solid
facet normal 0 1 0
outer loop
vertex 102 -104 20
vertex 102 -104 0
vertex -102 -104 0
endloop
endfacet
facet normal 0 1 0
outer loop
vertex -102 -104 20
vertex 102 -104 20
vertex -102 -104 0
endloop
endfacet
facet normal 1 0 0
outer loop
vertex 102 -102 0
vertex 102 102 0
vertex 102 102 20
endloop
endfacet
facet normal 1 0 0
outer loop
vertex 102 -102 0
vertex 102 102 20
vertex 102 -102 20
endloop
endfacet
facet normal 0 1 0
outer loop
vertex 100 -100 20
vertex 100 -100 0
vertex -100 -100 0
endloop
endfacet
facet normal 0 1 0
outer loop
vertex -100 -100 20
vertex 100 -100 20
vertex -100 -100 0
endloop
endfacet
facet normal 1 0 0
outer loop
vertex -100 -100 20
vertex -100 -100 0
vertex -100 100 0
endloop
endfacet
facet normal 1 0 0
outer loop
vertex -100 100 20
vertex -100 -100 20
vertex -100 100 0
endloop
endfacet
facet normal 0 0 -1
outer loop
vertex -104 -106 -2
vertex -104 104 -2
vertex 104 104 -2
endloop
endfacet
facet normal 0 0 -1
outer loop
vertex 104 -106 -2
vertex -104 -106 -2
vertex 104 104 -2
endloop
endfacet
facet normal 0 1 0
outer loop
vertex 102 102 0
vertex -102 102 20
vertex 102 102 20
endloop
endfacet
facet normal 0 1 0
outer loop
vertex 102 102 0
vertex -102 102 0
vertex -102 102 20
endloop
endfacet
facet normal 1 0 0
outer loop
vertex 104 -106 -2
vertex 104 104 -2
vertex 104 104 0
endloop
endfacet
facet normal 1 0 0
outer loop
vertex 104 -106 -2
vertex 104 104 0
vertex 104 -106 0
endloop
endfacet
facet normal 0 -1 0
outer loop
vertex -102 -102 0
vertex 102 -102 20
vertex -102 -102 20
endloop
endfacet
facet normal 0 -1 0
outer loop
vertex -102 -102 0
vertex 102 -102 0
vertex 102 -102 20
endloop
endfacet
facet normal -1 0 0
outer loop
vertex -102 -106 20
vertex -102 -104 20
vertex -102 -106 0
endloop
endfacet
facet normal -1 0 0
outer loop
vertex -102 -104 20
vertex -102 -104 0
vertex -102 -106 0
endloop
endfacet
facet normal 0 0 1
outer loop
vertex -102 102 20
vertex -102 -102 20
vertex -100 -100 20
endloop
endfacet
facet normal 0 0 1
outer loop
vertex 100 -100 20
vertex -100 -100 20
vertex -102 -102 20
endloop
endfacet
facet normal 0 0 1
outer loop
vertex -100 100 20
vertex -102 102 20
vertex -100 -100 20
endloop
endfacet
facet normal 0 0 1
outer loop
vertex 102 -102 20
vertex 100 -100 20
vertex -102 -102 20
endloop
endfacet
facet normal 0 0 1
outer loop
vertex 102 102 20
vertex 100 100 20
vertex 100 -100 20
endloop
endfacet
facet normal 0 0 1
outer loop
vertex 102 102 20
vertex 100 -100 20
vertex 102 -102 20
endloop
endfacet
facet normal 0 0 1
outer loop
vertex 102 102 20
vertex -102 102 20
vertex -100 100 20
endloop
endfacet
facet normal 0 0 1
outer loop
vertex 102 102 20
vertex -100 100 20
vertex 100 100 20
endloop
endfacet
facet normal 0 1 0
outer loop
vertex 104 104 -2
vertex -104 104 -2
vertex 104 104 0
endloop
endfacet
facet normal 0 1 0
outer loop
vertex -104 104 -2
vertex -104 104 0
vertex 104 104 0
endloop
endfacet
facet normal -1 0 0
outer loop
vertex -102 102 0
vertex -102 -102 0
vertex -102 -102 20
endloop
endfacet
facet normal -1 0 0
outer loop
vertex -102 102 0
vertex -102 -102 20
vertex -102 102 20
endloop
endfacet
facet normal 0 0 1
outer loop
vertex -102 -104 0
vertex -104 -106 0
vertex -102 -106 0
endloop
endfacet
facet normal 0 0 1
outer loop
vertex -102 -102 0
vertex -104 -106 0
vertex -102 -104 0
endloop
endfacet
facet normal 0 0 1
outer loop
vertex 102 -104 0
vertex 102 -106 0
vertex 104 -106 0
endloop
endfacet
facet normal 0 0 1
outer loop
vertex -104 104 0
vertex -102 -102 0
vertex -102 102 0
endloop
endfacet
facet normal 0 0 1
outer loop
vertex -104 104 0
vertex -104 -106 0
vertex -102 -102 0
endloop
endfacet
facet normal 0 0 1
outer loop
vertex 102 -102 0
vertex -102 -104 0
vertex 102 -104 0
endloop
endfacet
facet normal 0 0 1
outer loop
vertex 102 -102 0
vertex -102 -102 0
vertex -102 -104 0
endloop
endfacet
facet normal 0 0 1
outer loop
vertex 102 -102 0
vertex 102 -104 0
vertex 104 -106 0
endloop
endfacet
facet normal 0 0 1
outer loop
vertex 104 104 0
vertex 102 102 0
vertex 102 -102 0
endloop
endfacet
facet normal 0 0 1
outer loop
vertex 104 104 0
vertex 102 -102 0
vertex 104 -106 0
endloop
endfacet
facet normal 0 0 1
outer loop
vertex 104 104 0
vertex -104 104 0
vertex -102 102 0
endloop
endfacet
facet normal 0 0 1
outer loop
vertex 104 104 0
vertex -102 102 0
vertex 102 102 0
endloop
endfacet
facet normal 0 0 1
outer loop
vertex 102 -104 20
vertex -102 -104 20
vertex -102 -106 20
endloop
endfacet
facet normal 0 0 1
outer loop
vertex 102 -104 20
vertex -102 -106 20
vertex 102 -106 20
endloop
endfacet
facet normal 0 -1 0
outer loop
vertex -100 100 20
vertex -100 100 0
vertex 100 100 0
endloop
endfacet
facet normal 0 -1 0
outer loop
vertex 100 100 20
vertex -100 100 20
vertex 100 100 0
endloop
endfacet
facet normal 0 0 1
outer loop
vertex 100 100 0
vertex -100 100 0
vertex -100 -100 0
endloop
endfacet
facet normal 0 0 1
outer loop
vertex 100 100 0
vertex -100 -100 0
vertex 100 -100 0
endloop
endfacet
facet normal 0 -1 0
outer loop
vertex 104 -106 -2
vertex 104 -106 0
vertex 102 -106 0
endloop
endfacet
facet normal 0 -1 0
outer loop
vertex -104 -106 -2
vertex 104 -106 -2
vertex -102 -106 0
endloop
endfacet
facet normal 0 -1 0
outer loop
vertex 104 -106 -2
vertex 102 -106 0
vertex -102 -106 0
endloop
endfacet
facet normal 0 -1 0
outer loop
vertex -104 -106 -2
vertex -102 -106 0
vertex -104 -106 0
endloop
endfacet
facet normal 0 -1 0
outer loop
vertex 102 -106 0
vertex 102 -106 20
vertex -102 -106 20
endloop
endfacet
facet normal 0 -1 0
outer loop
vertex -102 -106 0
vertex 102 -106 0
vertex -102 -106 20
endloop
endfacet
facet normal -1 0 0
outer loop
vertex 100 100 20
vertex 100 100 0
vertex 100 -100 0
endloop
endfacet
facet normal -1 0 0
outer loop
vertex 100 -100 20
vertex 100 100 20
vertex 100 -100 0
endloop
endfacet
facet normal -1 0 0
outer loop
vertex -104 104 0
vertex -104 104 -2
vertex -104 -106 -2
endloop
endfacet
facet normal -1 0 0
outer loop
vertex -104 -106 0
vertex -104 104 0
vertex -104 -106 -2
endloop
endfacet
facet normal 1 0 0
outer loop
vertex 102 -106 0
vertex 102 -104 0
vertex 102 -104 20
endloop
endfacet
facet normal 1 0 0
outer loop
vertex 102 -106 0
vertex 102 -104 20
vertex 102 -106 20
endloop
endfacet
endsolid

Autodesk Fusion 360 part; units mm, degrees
sketch "Szkic5" plane through (0, 0, 0) normal (0, 0, 1) x (1, 0, 0)
  line L0 (-100, 100) -> (100, 100)
  line L1 (100, 100) -> (100, -100)
  line L2 (100, -100) -> (-100, -100)
  line L3 (-100, -100) -> (-100, 100)
  line L4 (-102, 102) -> (102, 102)
  line L5 (102, 102) -> (102, -102)
  line L6 (102, -102) -> (-102, -102)
  line L7 (-102, -102) -> (-102, 102)
  line L8 (-104, 104) -> (104, 104)
  line L9 (104, 104) -> (104, -104)
  line L10 (104, -104) -> (-104, -104)
  line L11 (-104, -104) -> (-104, 104)
  line L12 (-106, 106) -> (106, 106)
  line L13 (106, 106) -> (106, -106)
  line L14 (106, -106) -> (-106, -106)
  line L15 (-106, -106) -> (-106, 106)
  line L16 (-104, -104) -> (-104, -106)
  line L17 (104, -104) -> (104, -106)
  line L18 (102, -102) -> (102, -104)
  line L19 (-102, -102) -> (-102, -104)
  line L20 (-102, -104) -> (-102, -106)
  line L21 (104, -104) -> (104, -106)
  line L22 (102, -104) -> (102, -106)
  dimension "d31" = 2
  dimension "d32" = 2
  dimension "d33" = 2
  dimension "d34" = 2
  dimension "d35" = 2
  dimension "d36" = 2
  dimension "d37" = 2
  dimension "d38" = 2
  dimension "d39" = 2
  dimension "d40" = 2
  dimension "d41" = 2
  dimension "d42" = 2
extrude "Wyciągnięcie proste15" add sketch "Szkic5" against normal blind 2 contours L0 L1 L2 L3 | L4 L5 L7 L8 L9 L10 L11 L18 L19 | L4 L5 L6 L7 | L6 L10 L18 L19 | L10 L14 L16 L20 | L10 L14 L20 L22 | L10 L14 L17 L21 L22 | L8 L9 L11 L12 L13 L14 L15 L16 L17 L21
extrude "Wyciągnięcie proste16" add sketch "Szkic5" along normal blind 15 contours L4 L5 L6 L7
extrude "Wyciągnięcie proste17" add sketch "Szkic5" along normal blind 15 contours L10 L14 L16 L20 | L10 L14 L20 L22 | L10 L14 L17 L21 L22
extrude "Wyciągnięcie proste18" cut sketch "Szkic5" against normal blind 2 contours L8 L9 L11 L12 L13 L14 L15 L16 L17 L21
extrude "Extrude19" cut sketch "Szkic5" along normal blind 15 contours L10 L14 L16 L20 | L10 L14 L17 L21 L22
extrude "Extrude20" add 2 faces at (-33.3333, -101.3333, 15) (-34, -105.3333, 15) along direction (0, 0, 1) blind 5
